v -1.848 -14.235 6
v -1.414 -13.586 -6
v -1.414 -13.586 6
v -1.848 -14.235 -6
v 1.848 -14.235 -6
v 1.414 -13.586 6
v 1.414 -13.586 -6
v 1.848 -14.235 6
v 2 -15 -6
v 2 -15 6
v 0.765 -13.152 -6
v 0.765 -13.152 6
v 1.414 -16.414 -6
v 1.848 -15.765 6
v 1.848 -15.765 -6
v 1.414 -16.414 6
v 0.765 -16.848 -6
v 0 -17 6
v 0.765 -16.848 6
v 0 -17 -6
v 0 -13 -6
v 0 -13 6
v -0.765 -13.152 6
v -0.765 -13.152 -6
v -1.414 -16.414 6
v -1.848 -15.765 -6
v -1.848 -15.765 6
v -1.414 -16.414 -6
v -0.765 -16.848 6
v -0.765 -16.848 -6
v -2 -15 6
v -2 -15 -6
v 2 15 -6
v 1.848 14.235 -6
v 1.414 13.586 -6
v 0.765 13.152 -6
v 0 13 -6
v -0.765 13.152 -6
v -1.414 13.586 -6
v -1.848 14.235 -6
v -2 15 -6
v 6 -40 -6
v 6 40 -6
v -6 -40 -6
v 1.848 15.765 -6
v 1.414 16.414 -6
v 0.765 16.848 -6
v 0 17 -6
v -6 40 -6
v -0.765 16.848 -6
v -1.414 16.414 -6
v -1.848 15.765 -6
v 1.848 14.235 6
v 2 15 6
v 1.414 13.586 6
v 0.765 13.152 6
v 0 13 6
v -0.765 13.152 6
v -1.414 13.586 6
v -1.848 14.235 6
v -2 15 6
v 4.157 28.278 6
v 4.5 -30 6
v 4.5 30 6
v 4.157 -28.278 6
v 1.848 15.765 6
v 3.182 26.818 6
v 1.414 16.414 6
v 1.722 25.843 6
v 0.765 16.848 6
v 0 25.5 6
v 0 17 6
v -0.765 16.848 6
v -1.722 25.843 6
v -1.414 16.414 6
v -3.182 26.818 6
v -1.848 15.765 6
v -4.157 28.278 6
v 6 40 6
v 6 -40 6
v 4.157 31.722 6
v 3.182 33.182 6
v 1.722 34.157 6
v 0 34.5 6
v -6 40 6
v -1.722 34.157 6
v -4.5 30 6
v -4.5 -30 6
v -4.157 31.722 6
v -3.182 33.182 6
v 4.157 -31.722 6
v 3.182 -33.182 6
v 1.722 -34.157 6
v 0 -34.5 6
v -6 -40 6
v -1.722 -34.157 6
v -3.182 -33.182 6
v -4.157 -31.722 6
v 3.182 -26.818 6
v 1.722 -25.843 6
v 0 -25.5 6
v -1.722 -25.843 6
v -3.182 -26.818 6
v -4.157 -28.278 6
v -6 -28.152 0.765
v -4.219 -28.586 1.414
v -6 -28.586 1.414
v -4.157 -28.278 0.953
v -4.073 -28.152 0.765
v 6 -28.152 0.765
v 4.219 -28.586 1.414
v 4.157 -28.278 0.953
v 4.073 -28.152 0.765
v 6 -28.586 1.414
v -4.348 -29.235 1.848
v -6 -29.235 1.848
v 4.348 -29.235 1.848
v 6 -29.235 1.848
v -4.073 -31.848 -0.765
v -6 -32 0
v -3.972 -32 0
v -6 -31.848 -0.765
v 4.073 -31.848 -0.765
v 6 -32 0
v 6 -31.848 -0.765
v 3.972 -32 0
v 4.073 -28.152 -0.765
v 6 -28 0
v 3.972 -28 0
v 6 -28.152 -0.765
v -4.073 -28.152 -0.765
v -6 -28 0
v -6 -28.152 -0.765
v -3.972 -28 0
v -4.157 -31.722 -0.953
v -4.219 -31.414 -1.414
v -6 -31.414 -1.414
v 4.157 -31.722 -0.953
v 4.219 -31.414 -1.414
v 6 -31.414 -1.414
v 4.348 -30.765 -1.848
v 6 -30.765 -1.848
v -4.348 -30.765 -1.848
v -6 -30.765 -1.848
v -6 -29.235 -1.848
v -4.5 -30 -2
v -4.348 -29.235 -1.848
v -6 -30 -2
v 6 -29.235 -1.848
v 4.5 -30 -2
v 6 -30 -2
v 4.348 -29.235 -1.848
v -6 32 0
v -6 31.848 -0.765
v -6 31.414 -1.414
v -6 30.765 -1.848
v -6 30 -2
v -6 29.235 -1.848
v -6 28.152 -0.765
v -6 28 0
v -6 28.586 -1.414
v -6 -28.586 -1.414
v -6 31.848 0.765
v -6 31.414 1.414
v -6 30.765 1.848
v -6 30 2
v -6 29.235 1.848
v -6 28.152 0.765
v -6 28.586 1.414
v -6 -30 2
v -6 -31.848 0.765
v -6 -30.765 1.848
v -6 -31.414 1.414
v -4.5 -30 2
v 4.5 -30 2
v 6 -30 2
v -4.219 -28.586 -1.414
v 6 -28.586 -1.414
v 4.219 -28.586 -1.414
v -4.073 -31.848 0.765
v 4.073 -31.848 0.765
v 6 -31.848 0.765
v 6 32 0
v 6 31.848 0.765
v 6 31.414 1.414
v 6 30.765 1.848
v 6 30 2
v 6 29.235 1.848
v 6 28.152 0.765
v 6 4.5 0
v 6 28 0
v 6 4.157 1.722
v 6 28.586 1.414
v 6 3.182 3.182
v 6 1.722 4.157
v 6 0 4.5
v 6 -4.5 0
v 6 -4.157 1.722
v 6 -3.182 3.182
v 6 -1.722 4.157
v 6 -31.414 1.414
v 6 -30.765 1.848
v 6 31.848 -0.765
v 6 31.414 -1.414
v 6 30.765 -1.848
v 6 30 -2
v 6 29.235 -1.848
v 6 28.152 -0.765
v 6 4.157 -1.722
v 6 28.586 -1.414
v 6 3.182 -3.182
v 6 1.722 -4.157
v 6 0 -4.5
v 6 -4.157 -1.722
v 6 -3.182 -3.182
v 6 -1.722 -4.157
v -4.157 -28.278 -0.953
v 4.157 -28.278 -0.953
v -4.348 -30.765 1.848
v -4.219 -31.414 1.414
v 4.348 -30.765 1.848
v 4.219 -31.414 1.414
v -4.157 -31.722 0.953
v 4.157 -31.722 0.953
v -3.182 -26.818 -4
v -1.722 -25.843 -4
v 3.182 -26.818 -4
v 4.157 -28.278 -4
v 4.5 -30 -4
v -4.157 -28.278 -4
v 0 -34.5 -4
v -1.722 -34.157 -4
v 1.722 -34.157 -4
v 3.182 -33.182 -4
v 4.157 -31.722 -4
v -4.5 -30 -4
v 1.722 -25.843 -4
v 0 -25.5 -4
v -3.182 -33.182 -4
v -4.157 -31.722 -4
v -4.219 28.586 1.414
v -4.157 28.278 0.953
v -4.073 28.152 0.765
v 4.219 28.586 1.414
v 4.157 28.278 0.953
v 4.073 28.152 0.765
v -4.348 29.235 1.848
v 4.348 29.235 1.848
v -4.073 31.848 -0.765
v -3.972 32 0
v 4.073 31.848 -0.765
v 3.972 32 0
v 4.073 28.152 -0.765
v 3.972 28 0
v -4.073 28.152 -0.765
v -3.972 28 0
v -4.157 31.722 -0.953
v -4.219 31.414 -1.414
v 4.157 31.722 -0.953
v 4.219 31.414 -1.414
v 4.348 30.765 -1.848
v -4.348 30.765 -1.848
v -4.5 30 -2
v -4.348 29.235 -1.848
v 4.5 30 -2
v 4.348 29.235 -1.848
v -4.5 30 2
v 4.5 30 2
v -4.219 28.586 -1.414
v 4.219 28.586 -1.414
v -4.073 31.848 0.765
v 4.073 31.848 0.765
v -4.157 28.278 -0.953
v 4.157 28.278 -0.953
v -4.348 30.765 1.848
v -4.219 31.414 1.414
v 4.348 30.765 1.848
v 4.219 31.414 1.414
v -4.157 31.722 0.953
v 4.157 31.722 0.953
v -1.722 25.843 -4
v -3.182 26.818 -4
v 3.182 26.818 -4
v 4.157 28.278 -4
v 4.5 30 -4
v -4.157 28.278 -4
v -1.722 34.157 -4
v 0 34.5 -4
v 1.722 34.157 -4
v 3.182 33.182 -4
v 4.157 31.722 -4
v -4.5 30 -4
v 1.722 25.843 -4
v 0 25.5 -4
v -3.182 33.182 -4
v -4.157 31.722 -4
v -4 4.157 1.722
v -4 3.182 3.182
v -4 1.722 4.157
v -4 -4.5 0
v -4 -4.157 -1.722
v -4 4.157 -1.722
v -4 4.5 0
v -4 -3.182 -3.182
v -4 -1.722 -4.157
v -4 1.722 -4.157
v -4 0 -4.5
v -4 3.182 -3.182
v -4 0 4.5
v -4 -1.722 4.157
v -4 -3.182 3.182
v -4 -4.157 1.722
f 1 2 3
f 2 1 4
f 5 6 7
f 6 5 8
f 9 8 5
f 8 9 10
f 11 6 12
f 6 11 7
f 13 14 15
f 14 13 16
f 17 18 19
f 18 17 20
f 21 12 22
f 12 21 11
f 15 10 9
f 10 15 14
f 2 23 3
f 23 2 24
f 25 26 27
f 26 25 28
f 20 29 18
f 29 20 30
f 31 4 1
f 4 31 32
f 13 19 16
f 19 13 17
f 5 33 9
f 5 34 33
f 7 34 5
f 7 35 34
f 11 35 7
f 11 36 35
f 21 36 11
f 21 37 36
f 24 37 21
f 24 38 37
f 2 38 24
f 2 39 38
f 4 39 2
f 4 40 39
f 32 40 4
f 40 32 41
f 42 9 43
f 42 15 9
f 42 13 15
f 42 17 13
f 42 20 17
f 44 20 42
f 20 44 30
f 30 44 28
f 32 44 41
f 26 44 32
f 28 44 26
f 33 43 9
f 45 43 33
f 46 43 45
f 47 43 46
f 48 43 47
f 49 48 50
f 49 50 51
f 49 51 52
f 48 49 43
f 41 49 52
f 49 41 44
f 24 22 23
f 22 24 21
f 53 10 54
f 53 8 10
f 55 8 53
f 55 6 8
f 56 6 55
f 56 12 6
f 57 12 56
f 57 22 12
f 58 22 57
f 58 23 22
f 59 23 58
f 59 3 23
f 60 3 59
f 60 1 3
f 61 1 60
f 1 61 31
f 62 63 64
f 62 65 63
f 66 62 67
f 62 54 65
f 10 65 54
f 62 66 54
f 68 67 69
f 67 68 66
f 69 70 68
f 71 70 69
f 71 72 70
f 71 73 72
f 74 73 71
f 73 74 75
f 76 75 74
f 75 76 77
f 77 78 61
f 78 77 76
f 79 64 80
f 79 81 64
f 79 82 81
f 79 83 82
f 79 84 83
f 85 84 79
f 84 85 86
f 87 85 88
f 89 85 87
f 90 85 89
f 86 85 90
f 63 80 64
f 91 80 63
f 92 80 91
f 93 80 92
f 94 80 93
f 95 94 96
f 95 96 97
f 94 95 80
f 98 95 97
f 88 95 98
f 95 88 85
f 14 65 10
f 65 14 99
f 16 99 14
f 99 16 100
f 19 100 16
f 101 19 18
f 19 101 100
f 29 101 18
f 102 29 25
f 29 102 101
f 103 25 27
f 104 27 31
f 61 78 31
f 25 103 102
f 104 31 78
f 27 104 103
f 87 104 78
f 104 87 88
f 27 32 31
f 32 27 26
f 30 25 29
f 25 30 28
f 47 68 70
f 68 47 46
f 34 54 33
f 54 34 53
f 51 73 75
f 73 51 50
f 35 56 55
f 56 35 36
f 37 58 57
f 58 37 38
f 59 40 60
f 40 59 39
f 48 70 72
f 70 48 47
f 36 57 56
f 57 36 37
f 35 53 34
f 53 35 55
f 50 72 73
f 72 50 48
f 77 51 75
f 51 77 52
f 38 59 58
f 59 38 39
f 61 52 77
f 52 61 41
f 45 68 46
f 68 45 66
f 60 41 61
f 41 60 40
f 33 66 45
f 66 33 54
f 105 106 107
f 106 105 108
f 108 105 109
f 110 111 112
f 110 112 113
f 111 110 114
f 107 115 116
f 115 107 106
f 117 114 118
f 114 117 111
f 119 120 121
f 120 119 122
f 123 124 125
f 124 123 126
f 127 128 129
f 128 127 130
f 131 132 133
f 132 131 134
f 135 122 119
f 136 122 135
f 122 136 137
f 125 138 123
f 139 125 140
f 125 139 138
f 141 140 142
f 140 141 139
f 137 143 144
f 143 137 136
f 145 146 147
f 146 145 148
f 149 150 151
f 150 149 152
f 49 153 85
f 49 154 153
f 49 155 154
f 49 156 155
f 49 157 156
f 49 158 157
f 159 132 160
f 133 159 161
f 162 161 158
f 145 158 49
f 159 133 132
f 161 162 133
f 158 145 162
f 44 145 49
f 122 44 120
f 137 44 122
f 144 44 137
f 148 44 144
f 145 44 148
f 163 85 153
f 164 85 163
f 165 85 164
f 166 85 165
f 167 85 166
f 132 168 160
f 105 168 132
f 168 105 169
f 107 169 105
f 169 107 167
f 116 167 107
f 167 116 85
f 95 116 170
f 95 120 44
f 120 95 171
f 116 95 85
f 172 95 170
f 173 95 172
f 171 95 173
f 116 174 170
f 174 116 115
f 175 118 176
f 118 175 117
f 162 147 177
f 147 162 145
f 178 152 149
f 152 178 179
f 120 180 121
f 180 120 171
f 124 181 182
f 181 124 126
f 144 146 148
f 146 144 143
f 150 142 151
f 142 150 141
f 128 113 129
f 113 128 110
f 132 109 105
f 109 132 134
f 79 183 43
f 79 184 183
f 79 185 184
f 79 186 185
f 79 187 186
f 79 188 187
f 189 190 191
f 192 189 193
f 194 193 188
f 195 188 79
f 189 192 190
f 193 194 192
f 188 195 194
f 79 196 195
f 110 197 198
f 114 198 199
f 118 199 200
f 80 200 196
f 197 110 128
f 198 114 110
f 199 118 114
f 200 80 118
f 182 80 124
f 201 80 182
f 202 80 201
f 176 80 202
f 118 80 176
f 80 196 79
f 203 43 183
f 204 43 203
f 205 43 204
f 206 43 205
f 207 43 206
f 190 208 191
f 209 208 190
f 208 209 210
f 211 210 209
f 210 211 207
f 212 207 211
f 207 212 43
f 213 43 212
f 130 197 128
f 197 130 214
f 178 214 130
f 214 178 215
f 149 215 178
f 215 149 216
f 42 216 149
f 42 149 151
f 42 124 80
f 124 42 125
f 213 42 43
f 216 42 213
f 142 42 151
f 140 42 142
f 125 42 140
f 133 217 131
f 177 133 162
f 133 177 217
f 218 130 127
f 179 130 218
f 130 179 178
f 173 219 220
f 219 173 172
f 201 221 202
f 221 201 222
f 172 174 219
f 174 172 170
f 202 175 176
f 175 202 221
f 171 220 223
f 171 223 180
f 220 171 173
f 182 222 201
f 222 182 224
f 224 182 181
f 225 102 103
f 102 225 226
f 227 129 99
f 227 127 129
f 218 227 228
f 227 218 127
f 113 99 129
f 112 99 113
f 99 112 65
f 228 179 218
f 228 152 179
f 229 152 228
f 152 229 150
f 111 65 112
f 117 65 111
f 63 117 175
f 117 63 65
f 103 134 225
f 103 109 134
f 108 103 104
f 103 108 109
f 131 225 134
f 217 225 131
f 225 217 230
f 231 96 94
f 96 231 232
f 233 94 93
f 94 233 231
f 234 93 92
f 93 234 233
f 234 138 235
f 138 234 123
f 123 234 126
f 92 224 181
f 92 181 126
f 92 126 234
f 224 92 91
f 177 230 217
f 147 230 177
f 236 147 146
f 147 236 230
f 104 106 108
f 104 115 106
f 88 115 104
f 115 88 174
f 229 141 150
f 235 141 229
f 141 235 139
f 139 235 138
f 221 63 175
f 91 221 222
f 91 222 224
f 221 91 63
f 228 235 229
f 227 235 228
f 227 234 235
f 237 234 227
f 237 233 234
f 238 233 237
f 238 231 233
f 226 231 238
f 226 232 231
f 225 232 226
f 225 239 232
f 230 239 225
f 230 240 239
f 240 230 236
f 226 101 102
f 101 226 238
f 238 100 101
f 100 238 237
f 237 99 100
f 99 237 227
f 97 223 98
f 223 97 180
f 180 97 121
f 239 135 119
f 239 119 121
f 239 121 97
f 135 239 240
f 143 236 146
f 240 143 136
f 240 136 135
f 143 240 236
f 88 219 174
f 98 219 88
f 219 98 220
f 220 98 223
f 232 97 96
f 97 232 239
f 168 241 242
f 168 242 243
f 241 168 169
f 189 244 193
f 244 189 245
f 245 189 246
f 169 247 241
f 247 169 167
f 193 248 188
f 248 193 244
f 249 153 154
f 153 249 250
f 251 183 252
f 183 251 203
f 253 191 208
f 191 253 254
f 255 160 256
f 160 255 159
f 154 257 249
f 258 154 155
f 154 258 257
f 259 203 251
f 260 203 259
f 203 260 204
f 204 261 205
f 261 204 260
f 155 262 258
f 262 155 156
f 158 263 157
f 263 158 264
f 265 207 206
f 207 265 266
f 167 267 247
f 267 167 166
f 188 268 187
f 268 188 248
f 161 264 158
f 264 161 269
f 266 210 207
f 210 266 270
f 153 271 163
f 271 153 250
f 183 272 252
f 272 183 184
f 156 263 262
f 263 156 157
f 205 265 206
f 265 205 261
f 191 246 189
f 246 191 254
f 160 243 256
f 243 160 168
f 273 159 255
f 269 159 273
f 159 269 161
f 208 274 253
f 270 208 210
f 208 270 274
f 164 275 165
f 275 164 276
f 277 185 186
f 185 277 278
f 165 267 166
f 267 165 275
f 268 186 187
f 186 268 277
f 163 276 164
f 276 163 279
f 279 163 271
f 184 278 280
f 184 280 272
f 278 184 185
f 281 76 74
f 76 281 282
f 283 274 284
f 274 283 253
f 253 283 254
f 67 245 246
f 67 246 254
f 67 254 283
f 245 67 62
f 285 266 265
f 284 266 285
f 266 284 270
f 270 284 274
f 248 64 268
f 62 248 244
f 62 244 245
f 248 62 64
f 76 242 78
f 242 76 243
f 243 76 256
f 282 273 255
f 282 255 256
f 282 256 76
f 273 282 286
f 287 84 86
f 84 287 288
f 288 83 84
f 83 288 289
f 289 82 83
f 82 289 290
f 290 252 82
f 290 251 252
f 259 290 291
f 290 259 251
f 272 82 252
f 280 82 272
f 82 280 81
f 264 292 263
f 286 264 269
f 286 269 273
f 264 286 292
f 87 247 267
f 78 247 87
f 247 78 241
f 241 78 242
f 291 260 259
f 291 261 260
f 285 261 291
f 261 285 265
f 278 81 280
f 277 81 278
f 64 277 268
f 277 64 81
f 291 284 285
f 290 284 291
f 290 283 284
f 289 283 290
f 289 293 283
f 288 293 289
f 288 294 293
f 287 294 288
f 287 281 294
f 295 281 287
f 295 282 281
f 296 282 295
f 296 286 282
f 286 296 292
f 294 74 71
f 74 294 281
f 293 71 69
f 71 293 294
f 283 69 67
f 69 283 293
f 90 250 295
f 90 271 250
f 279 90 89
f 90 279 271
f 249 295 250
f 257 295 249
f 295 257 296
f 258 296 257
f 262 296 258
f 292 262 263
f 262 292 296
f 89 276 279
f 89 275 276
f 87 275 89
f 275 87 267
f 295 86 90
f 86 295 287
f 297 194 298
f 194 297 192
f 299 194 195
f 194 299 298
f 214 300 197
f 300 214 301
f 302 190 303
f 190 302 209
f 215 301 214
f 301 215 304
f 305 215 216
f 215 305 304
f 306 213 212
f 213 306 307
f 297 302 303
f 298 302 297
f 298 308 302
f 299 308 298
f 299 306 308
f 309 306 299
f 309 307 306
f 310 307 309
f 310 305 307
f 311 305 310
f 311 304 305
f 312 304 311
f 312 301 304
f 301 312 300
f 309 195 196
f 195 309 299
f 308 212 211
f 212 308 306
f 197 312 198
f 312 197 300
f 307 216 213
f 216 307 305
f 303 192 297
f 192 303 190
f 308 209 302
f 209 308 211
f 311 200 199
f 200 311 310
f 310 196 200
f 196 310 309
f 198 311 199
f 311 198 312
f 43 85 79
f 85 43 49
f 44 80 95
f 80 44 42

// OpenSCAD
// file: ../operators/shortcuts.scad
// Translate
module tra(v) { translate(v) children(); }
module trax(x) { translate([x, 0, 0]) children(); }
module tray(y) { translate([0, y, 0]) children(); }
module traz(z) { translate([0, 0, z]) children(); }

// Scale
module sca(v) { scale(v) children(); }
module scax(x) { scale([x, 1, 1]) children(); }
module scay(y) { scale([1, y, 1]) children(); }
module scaz(z) { scale([1, 1, z]) children(); }

// Rotate
module rot(a, v) { rotate(a, v) children(); }
module rotx(x) { rotate([x, 0, 0]) children(); }
module roty(y) { rotate([0, y, 0]) children(); }
module rotz(z) { rotate([0, 0, z]) children(); }

// Symmetry
module sym(v) { mirror(v) children(); }
module symx() { mirror([1, 0, 0]) children(); }
module symy() { mirror([0, 1, 0]) children(); }
module symz() { mirror([0, 0, 1]) children(); }

// Mirror
module mir(v) { children(); mirror(v) children(); }
module mirx() { children(); mirror([1, 0, 0]) children(); }
module miry() { children(); mirror([0, 1, 0]) children(); }
module mirz() { children(); mirror([0, 0, 1]) children(); }
// main file
include <../operators/shortcuts.scad>

module spoolHolder() {
    module holes() {
        miry() tray(-15) cylinder(h = 12, d = 4, center = true);

        miry() tray(-30) {
            roty(90) cylinder(h = 12, d = 4, center = true);
            traz(2) cylinder(h = 12, d = 9, center = true);
        }

        trax(2) roty(90) cylinder(h = 12, d = 9, center = true);
    }

    difference() {
        cube([12, 80, 12], center = true);
        holes();
    }
}

spoolHolder($fn = 16);
